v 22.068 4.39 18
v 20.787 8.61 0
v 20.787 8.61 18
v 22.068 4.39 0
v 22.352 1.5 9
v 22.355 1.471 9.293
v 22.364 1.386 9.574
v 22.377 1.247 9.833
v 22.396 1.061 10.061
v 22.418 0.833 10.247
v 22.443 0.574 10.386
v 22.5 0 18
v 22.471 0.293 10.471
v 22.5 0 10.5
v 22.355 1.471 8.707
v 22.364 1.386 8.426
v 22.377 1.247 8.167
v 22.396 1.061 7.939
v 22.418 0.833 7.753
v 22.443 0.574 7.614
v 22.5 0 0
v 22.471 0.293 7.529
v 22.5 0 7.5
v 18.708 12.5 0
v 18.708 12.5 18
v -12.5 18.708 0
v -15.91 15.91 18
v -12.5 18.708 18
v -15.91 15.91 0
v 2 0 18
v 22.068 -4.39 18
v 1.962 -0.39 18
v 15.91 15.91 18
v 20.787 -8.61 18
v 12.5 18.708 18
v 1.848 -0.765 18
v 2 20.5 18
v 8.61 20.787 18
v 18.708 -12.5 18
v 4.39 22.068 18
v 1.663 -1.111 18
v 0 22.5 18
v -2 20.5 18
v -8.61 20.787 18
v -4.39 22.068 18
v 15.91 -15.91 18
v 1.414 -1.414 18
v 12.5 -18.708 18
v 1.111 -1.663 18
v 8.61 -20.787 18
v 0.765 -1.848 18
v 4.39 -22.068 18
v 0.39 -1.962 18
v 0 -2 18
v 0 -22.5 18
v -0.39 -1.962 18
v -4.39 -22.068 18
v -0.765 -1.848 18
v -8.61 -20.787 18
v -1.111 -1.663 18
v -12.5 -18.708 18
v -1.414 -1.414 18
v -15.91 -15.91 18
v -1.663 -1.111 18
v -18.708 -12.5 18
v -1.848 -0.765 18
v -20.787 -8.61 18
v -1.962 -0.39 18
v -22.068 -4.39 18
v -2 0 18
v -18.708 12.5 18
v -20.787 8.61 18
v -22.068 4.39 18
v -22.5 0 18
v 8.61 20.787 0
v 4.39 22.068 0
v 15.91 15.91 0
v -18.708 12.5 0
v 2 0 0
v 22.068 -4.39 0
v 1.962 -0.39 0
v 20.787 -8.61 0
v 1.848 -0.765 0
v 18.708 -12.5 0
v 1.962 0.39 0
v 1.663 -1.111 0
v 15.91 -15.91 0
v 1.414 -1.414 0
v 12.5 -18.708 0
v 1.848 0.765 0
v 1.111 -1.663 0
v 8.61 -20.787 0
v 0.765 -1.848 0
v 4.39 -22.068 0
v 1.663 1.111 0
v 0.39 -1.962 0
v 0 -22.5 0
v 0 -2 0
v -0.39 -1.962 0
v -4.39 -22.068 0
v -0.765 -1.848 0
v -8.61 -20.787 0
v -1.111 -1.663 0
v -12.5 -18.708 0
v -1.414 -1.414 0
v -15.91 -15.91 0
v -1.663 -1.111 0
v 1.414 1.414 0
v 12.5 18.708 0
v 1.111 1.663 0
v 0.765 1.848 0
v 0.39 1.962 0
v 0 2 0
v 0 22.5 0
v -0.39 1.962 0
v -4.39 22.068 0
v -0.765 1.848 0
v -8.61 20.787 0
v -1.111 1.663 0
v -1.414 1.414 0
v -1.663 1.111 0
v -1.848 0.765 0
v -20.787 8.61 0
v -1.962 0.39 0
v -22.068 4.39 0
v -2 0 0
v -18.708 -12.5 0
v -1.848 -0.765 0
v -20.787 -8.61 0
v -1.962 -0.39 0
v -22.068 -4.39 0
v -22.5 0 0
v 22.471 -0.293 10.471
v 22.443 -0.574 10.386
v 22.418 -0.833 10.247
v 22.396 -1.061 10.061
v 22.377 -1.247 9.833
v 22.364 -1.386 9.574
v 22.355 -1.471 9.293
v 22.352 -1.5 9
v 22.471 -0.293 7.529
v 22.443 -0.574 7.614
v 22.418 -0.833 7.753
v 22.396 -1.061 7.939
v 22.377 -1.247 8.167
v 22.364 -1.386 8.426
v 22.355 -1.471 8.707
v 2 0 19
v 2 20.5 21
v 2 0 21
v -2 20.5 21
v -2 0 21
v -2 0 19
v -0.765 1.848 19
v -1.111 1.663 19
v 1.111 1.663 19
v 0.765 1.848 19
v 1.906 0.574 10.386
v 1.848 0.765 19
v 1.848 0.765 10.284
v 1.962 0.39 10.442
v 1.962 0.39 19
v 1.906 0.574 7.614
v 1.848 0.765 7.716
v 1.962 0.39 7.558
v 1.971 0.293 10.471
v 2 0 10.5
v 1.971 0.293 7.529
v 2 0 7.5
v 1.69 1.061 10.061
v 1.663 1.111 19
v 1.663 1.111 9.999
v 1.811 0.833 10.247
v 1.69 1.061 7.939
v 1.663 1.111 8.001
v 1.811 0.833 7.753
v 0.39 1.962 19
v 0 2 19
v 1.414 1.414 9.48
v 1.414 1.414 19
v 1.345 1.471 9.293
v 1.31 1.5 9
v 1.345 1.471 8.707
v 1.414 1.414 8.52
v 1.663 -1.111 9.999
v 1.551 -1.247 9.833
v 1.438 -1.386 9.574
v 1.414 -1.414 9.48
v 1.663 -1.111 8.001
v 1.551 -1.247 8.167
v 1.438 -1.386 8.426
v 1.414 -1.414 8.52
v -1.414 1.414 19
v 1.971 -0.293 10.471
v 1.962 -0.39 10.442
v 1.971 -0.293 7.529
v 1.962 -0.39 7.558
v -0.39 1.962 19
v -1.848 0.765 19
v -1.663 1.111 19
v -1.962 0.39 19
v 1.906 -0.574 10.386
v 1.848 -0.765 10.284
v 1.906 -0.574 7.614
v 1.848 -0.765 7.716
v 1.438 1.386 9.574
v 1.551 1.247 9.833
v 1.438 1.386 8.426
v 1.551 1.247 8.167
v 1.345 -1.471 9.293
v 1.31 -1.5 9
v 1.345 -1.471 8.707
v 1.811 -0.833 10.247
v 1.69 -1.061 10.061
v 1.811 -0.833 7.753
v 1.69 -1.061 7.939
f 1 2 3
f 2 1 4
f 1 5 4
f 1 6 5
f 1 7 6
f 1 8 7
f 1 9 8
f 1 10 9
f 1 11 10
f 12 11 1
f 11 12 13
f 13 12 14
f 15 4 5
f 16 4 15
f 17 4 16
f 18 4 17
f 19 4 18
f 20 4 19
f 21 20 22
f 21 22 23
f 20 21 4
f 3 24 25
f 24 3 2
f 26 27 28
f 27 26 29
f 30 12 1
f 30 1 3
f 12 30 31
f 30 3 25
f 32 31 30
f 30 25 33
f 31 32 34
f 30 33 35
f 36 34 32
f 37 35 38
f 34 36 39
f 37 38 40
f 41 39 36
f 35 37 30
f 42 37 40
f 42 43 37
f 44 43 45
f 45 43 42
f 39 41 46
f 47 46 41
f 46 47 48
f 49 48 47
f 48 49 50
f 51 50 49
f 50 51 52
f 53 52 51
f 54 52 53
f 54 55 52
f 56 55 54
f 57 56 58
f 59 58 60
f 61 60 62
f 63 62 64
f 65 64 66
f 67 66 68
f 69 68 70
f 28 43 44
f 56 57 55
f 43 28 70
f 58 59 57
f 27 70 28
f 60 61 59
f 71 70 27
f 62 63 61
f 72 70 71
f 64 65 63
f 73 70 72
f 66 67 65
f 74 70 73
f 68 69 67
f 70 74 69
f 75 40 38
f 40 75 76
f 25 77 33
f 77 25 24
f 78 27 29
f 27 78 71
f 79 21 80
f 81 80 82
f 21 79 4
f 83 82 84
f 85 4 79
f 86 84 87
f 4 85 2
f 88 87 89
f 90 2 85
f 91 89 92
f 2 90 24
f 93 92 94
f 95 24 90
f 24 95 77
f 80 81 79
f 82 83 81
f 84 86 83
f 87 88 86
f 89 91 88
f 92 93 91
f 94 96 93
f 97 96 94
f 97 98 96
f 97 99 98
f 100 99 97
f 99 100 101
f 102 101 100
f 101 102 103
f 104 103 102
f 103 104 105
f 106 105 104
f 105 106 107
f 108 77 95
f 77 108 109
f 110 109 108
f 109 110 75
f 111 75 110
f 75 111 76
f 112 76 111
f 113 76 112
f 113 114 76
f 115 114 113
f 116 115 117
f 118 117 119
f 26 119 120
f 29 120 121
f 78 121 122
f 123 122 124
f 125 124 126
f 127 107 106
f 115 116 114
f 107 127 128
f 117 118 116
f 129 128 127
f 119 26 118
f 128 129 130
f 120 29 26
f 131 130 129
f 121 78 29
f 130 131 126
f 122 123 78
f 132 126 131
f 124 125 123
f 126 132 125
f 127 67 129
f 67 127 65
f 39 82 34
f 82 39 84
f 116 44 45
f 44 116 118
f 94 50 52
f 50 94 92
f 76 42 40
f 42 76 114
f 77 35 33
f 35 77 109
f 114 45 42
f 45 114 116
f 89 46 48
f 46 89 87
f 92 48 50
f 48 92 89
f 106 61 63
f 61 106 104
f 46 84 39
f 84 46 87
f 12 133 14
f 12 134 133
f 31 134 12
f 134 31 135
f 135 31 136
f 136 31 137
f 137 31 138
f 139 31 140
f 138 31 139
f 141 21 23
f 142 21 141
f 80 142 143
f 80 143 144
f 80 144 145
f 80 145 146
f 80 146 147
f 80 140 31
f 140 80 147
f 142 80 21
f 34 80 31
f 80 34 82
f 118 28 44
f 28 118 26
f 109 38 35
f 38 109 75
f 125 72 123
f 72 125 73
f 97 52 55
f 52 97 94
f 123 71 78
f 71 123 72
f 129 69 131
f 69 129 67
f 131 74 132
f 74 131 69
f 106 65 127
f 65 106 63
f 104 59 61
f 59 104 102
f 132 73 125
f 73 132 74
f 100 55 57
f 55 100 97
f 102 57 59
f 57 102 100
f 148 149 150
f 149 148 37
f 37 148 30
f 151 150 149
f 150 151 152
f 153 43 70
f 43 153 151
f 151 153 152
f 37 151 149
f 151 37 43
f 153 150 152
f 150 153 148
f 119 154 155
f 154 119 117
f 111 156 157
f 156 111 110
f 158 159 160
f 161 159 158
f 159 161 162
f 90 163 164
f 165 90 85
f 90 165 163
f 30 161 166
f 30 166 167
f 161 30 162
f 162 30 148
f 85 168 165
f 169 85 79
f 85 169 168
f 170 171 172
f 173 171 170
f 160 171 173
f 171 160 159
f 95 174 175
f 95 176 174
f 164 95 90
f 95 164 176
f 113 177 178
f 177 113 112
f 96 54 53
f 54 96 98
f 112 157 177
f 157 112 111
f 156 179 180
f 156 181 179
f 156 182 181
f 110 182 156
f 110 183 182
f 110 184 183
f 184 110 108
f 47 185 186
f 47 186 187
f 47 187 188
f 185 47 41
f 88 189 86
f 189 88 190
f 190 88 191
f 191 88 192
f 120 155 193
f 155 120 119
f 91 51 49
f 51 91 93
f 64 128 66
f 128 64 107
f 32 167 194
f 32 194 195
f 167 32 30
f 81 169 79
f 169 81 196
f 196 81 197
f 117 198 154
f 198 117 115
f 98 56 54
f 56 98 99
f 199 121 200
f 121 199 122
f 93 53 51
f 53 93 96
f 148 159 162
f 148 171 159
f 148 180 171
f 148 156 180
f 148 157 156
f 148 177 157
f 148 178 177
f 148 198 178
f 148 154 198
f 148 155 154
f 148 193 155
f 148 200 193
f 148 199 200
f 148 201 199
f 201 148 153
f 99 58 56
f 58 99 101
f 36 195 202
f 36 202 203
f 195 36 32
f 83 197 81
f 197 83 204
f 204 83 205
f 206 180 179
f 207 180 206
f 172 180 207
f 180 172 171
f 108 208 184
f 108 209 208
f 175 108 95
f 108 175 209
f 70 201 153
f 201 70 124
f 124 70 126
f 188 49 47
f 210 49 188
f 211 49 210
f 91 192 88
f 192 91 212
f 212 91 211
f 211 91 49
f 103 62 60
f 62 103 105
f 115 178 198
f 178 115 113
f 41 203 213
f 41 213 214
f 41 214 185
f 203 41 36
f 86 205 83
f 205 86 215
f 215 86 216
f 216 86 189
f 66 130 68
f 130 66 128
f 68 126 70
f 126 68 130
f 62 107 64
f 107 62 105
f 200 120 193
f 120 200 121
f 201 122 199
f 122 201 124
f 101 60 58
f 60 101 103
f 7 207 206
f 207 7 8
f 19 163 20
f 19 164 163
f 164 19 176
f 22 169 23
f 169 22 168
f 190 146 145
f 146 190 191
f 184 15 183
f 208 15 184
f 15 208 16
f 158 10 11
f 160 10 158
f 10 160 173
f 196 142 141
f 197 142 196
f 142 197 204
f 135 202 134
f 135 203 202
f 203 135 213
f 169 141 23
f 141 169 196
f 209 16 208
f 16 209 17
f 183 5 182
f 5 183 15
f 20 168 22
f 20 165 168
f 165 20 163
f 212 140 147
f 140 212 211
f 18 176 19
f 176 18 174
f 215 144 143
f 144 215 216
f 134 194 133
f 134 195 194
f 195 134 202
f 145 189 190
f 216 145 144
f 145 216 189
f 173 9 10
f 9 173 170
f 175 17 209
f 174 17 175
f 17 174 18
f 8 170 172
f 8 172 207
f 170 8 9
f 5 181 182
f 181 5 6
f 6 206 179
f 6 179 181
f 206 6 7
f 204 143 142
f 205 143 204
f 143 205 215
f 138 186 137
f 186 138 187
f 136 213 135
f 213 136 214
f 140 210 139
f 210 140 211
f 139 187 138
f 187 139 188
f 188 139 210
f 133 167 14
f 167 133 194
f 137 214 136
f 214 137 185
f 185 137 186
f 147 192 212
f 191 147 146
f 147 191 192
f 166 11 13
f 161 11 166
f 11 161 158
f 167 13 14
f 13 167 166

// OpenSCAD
$fn = 32;

// ----------------------------------------------------------------------
// Control knob: pointer knob
// ----------------------------------------------------------------------

// --- parameters (mm) ---
rib_w = 4;                // pointer rib width
rib_h = 4;                // pointer rib height
knob_d = 45;              // knob body diameter
knob_h = 18;              // knob body height
bore_d = 4;               // shaft bore diameter
set_d = 3;                // set screw bore diameter

rib_poke = rib_h - 1;  // rib height above the top
total_h = knob_h + rib_h - 1;  // overall height

difference() {
  union() {
    cylinder(h = knob_h, d = knob_d);
    translate([-rib_w / 2, 0, knob_h - 1])
      cube([rib_w, knob_d / 2 - 2, rib_h]);
  }
  translate([0, 0, -1]) cylinder(h = knob_h + 2, d = bore_d);
  translate([-1, 0, knob_h / 2]) rotate([0, 90, 0])
    cylinder(h = knob_d / 2 + bore_d / 2 + 2, d = set_d);}
